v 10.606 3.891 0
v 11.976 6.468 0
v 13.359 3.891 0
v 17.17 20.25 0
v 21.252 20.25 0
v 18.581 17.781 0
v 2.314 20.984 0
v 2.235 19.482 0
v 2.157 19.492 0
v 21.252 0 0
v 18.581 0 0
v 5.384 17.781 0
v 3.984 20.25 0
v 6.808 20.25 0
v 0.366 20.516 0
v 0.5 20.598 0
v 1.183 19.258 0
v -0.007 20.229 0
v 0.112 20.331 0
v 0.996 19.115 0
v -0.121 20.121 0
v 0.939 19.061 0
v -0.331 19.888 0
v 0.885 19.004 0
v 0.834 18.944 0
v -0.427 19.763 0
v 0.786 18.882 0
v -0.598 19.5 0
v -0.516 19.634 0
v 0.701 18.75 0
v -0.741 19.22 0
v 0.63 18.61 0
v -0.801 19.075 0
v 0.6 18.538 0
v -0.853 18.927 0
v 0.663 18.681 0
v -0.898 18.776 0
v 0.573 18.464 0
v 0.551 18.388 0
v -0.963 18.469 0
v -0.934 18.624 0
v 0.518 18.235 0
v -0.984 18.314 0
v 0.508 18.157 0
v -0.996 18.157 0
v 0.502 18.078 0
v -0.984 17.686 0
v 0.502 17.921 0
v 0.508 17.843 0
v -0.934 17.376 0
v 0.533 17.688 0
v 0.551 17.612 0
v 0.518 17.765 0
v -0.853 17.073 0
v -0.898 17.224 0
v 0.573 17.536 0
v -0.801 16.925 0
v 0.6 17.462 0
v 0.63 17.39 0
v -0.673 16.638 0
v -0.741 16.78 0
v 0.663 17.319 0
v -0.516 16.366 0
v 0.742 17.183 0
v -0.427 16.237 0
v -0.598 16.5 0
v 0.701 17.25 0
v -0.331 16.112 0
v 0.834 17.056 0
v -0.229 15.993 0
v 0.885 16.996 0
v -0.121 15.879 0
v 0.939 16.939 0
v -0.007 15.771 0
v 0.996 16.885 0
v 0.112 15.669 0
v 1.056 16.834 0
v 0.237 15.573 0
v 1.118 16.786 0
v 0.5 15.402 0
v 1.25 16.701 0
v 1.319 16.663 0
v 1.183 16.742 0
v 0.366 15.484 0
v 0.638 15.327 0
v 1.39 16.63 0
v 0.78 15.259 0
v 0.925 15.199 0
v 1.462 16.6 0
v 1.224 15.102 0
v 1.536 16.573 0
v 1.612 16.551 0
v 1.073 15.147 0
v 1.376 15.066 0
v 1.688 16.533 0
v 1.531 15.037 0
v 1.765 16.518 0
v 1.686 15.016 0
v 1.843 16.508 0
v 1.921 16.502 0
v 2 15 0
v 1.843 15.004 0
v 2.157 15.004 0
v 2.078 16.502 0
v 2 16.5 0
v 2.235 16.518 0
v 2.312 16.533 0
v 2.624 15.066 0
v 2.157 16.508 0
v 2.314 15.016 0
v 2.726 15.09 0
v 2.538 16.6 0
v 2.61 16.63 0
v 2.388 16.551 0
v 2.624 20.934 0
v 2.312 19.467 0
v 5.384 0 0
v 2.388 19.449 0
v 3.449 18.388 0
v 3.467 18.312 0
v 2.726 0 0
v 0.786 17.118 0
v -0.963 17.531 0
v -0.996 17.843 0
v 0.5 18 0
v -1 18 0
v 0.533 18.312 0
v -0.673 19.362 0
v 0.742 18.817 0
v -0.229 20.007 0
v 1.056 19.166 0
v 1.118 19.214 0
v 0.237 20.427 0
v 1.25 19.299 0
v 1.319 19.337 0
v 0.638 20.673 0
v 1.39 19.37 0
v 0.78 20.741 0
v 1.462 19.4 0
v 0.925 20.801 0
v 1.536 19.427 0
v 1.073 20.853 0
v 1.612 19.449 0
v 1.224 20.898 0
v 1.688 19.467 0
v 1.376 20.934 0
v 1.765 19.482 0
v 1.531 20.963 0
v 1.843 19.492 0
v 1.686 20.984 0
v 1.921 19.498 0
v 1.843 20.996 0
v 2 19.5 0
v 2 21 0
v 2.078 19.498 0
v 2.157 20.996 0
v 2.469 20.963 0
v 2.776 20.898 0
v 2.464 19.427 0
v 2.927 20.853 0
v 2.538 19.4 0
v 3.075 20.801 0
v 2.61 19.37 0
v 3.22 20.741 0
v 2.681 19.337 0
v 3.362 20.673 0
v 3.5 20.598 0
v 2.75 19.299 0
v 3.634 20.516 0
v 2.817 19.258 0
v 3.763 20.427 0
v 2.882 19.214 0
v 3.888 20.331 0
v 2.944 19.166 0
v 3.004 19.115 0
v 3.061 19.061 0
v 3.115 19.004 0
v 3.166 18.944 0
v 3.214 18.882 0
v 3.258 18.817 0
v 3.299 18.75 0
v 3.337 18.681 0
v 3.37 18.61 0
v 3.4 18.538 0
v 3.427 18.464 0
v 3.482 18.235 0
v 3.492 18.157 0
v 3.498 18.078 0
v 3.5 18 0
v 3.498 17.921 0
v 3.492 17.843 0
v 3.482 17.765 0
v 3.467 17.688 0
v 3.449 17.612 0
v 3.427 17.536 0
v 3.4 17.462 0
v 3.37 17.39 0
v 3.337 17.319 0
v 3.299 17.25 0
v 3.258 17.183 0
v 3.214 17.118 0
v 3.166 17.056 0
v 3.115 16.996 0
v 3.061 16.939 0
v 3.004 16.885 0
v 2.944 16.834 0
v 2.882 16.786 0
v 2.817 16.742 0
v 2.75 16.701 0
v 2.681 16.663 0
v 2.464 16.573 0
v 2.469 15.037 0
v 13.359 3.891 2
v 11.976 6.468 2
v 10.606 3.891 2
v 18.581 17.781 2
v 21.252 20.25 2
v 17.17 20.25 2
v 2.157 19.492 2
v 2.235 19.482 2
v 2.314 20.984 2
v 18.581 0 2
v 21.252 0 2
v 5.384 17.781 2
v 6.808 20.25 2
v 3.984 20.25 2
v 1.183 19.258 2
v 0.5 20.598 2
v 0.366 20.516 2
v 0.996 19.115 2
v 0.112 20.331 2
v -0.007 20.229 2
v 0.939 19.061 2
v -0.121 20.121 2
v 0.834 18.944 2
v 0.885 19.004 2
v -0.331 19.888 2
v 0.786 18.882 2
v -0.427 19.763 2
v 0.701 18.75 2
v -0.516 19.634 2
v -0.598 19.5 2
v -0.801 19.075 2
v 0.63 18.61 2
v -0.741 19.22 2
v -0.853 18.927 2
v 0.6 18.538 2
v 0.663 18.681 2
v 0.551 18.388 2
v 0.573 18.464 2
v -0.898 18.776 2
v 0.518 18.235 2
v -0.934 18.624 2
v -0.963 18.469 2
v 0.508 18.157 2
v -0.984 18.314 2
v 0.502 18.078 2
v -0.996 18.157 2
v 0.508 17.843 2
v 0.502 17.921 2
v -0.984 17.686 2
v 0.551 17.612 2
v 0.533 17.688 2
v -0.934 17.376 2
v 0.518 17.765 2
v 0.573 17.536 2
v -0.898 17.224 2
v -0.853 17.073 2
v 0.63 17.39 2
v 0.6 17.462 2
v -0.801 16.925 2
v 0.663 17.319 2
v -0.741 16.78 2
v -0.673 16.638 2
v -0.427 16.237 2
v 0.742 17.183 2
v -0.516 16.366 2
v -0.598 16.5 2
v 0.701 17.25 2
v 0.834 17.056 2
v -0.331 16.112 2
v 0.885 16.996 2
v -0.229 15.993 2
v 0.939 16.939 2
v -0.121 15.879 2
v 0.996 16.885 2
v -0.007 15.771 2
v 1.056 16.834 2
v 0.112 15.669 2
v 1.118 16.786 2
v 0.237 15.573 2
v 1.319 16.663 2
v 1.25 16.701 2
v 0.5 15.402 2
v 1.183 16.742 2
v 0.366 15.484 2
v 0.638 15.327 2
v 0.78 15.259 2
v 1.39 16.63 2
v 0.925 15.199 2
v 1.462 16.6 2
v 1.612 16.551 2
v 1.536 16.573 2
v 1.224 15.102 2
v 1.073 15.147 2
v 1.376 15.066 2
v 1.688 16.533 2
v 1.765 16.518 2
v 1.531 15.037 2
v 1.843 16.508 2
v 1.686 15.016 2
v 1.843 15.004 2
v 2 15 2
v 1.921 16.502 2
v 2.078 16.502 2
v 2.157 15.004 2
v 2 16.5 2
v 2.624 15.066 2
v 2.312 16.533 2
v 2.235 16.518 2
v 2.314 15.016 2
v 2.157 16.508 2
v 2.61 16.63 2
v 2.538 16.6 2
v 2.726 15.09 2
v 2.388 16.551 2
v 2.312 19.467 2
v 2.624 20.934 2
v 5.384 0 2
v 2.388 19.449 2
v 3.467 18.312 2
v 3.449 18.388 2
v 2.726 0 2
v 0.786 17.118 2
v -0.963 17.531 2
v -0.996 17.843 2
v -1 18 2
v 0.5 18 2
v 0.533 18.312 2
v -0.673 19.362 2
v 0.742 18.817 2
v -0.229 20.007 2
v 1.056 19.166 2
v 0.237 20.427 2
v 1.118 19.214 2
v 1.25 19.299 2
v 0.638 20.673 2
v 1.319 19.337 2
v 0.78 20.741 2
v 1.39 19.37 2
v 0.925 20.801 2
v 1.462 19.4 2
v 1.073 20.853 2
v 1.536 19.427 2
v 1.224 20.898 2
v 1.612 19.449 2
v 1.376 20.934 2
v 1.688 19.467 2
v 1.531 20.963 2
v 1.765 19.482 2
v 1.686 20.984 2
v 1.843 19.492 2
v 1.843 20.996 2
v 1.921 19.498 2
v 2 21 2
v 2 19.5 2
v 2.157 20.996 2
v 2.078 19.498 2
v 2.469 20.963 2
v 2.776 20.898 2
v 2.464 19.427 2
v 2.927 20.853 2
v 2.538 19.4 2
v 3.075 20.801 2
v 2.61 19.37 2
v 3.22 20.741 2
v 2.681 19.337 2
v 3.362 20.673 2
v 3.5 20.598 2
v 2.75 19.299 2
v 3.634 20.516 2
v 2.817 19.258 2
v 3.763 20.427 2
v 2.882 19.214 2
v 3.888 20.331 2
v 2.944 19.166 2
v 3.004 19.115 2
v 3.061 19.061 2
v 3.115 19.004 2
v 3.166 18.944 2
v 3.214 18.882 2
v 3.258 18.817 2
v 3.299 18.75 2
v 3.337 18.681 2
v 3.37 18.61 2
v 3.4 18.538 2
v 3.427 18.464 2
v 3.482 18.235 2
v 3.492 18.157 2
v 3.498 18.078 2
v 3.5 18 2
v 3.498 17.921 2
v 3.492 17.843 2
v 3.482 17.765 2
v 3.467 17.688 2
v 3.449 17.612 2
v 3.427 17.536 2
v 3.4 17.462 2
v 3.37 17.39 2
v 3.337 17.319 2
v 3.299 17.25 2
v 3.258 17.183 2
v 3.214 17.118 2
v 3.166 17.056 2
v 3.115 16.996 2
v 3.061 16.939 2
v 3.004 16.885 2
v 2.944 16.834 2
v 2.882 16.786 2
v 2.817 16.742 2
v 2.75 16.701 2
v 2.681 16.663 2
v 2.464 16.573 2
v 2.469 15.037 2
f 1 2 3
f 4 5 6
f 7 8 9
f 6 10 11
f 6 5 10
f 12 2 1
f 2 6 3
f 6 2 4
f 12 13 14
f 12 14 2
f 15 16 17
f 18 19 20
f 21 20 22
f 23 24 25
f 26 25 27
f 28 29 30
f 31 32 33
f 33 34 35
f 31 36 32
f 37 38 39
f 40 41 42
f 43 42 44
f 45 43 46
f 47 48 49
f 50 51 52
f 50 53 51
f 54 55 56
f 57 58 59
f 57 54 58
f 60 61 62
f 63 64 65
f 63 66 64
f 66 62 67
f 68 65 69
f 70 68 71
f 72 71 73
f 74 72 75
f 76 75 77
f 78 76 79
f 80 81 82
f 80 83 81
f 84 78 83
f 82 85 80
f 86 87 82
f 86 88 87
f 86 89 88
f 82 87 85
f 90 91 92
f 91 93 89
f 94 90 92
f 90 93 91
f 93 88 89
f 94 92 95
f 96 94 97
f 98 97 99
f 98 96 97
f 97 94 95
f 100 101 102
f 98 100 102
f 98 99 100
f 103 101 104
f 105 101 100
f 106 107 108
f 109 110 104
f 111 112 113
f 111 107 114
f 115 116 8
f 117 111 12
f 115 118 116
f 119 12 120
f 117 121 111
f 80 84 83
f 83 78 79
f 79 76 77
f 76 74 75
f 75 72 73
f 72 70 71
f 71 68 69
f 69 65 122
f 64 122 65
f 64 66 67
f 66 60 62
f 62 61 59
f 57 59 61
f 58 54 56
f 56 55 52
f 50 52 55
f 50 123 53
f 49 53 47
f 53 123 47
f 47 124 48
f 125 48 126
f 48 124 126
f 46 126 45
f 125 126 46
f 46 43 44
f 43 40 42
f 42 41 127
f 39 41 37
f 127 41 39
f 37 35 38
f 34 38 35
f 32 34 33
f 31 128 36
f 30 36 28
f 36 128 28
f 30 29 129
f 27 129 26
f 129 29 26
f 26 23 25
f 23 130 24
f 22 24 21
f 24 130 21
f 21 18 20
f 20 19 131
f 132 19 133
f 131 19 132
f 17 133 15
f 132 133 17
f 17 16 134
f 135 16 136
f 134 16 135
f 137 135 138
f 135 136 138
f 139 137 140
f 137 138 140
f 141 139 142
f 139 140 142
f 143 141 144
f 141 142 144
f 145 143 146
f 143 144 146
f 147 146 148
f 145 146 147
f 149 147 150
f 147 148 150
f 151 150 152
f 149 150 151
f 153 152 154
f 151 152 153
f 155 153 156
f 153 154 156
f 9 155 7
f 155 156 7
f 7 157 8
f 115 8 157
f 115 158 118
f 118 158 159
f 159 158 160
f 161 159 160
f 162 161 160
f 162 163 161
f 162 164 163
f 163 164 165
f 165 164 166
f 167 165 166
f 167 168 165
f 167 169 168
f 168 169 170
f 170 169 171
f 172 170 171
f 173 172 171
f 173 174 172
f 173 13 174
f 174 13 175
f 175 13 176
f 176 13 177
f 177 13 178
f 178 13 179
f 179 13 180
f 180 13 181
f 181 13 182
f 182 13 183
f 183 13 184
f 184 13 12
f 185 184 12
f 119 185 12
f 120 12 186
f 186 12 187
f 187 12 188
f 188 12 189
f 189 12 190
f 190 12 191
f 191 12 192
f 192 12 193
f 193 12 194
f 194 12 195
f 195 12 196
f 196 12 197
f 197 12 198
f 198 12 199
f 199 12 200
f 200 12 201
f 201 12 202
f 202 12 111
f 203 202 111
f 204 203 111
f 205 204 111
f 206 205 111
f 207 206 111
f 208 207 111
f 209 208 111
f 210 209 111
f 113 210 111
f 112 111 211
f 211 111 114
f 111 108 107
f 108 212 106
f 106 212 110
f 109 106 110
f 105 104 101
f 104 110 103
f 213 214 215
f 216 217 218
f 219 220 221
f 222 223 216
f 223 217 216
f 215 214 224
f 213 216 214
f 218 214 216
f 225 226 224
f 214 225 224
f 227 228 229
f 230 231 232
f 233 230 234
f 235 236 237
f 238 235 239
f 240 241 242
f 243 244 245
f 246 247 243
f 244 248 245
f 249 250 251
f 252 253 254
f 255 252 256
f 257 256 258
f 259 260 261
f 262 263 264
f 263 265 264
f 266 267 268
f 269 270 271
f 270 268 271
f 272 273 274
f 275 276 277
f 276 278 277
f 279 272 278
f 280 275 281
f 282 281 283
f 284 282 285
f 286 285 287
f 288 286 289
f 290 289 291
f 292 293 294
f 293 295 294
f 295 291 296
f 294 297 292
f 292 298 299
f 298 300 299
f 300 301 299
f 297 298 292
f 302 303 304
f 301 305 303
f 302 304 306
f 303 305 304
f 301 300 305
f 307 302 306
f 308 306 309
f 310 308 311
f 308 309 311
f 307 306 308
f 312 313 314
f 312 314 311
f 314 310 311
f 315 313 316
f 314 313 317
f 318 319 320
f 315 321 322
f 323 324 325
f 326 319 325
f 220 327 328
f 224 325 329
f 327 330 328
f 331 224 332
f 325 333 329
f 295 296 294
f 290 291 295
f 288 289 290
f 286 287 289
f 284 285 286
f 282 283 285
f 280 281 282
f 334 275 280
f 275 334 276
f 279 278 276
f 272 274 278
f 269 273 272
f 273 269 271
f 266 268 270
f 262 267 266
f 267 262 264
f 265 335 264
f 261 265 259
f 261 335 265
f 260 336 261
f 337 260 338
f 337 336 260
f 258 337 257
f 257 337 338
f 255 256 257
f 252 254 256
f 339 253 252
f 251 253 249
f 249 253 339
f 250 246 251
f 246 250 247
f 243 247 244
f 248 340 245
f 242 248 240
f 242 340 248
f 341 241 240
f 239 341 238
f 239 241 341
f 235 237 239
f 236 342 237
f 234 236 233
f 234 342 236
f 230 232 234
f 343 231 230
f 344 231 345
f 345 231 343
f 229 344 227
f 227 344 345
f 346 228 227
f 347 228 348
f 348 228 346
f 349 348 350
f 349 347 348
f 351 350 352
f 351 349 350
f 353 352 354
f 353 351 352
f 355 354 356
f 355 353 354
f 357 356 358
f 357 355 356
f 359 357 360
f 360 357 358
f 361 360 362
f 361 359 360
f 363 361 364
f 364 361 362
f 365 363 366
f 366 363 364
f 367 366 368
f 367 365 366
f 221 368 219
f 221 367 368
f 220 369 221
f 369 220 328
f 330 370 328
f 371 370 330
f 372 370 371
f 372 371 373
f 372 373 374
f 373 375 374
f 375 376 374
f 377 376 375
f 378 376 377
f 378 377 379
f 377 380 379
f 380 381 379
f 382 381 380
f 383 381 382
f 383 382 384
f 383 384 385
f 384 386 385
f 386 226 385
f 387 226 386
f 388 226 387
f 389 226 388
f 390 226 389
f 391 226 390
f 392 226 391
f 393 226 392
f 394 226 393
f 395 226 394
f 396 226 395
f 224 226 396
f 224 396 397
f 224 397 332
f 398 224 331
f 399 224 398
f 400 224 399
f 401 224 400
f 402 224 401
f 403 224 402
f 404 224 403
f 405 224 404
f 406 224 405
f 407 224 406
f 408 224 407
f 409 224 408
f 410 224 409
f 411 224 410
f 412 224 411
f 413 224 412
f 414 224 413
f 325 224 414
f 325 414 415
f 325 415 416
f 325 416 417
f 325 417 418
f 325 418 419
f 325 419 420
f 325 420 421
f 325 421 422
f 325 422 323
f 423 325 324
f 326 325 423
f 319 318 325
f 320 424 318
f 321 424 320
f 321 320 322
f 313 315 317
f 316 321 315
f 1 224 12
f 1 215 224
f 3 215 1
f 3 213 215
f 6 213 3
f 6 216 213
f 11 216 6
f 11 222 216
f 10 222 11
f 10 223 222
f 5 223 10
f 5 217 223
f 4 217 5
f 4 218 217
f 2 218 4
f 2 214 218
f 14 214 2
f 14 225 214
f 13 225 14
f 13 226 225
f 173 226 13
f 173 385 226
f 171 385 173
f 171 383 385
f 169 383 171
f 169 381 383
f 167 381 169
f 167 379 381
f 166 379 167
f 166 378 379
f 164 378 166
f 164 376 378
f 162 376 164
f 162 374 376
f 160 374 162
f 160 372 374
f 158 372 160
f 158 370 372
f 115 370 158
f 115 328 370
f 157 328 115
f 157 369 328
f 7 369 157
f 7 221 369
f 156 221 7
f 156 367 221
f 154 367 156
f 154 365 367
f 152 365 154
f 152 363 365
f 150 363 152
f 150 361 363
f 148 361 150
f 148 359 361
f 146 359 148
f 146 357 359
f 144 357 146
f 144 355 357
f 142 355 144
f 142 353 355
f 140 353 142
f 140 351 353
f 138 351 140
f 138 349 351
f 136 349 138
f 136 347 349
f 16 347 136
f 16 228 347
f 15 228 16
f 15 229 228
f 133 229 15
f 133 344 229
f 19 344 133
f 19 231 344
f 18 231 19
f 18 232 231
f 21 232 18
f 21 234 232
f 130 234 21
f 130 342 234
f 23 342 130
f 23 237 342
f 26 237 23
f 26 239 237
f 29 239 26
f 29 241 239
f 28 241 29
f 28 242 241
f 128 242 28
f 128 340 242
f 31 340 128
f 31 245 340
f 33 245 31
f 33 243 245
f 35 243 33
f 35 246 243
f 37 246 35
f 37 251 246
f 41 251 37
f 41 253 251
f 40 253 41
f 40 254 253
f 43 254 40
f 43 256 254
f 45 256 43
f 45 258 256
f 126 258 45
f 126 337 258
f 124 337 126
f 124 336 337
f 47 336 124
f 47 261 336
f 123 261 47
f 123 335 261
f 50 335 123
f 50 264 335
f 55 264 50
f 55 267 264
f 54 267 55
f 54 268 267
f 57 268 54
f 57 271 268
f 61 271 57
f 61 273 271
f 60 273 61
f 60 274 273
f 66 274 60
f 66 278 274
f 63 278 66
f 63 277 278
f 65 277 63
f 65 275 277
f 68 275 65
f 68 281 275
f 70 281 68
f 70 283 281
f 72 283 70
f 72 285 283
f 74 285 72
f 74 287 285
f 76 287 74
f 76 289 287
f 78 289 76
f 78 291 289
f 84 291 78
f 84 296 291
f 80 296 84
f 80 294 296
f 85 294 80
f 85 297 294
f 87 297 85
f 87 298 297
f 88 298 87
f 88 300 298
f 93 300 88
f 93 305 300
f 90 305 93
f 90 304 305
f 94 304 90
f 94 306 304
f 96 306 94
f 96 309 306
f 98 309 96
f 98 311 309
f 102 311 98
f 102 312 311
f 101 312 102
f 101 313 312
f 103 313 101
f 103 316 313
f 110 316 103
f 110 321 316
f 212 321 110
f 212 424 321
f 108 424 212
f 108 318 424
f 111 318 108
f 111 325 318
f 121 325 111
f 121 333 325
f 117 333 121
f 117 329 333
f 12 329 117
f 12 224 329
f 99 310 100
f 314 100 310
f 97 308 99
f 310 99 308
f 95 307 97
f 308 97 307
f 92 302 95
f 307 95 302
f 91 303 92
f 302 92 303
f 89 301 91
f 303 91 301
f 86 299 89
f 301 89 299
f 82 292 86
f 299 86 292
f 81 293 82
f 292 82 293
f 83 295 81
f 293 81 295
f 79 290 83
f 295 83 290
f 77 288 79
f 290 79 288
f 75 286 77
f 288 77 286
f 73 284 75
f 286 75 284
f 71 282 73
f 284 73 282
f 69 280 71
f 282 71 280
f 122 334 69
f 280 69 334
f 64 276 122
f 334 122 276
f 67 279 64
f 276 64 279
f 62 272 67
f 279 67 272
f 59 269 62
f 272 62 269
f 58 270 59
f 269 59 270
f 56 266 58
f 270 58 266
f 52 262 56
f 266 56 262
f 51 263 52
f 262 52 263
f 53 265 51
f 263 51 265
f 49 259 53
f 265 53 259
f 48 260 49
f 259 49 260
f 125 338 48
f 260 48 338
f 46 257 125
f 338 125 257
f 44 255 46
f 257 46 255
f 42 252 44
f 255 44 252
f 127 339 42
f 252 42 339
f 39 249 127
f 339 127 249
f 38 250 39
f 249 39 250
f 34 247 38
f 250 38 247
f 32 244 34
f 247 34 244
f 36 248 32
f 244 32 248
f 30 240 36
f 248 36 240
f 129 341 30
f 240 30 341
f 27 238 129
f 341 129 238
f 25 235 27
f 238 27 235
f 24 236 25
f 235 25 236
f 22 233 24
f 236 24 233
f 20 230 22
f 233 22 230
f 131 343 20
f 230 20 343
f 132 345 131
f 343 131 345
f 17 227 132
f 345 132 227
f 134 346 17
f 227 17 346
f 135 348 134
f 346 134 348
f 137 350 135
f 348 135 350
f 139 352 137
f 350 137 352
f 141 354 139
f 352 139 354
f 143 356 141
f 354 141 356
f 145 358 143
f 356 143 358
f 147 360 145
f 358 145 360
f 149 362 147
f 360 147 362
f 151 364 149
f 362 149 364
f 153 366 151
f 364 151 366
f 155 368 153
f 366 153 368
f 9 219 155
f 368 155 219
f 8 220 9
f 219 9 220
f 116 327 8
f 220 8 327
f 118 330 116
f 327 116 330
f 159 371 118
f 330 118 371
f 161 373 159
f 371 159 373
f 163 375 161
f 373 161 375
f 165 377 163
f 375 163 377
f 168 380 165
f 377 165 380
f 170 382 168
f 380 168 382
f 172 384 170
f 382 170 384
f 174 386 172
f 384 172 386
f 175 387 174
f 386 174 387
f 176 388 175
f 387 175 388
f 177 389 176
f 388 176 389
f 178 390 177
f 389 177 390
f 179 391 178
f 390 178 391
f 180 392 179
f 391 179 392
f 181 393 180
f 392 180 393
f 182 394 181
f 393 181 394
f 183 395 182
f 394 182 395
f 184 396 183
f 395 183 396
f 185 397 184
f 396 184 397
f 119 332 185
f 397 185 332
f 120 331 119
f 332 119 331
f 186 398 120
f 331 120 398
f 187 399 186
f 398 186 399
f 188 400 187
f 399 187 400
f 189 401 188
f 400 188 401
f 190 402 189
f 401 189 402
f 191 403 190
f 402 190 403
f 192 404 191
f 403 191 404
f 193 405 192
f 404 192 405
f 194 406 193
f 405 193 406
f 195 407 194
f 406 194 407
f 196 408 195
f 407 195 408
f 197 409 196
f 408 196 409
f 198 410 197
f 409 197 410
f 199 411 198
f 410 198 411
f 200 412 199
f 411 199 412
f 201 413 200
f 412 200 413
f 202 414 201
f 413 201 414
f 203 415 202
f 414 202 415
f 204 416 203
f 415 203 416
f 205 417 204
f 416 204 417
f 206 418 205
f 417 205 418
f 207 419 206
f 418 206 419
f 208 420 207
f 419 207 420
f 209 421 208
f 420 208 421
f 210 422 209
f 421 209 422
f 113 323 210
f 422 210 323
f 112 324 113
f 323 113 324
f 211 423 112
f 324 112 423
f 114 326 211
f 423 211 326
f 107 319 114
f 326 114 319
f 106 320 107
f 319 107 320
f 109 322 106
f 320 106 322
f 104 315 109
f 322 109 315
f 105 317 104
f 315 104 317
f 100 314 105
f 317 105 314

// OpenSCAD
$fn=120;

letter([["C", 10, 20]]);
letter([["J", 12, 18]]);
letter([["K", 12, 18]]);
letter([["O", 12, 18]]);
letter([["R", 2, 18]]);
!letter([["M", 2, 18]]);
letter([["O", 12, 18], ["+", -1, -1, 16, 3], ["F", -1, -1, 29, 0]]);
letter([["J", 12, 18], ["+", -1, -1, 11, 3], ["L", -1, -1, 24, 0]]);

module letter(letters) {
  for (letter = letters) {
    symbol = letter[0];
    holeX = letter[1];
    holeY = letter[2];
    shiftX = letter[3];
    shiftY = letter[4];

    translate([shiftX, shiftY]) {
       linear_extrude(height=2) {
        if (holeX>0) {
          difference() {
            union() {
              text(symbol, size=20, font=".SF NS Rounded:style=Bold G2");
              translate([holeX, holeY]) circle(r=3);
            }
            translate([holeX, holeY]) circle(r=1.5);
          }
        } else {
          text(symbol, size=20, font=".SF NS Rounded:style=Bold G2");
        }
      }
    }
  }
}
